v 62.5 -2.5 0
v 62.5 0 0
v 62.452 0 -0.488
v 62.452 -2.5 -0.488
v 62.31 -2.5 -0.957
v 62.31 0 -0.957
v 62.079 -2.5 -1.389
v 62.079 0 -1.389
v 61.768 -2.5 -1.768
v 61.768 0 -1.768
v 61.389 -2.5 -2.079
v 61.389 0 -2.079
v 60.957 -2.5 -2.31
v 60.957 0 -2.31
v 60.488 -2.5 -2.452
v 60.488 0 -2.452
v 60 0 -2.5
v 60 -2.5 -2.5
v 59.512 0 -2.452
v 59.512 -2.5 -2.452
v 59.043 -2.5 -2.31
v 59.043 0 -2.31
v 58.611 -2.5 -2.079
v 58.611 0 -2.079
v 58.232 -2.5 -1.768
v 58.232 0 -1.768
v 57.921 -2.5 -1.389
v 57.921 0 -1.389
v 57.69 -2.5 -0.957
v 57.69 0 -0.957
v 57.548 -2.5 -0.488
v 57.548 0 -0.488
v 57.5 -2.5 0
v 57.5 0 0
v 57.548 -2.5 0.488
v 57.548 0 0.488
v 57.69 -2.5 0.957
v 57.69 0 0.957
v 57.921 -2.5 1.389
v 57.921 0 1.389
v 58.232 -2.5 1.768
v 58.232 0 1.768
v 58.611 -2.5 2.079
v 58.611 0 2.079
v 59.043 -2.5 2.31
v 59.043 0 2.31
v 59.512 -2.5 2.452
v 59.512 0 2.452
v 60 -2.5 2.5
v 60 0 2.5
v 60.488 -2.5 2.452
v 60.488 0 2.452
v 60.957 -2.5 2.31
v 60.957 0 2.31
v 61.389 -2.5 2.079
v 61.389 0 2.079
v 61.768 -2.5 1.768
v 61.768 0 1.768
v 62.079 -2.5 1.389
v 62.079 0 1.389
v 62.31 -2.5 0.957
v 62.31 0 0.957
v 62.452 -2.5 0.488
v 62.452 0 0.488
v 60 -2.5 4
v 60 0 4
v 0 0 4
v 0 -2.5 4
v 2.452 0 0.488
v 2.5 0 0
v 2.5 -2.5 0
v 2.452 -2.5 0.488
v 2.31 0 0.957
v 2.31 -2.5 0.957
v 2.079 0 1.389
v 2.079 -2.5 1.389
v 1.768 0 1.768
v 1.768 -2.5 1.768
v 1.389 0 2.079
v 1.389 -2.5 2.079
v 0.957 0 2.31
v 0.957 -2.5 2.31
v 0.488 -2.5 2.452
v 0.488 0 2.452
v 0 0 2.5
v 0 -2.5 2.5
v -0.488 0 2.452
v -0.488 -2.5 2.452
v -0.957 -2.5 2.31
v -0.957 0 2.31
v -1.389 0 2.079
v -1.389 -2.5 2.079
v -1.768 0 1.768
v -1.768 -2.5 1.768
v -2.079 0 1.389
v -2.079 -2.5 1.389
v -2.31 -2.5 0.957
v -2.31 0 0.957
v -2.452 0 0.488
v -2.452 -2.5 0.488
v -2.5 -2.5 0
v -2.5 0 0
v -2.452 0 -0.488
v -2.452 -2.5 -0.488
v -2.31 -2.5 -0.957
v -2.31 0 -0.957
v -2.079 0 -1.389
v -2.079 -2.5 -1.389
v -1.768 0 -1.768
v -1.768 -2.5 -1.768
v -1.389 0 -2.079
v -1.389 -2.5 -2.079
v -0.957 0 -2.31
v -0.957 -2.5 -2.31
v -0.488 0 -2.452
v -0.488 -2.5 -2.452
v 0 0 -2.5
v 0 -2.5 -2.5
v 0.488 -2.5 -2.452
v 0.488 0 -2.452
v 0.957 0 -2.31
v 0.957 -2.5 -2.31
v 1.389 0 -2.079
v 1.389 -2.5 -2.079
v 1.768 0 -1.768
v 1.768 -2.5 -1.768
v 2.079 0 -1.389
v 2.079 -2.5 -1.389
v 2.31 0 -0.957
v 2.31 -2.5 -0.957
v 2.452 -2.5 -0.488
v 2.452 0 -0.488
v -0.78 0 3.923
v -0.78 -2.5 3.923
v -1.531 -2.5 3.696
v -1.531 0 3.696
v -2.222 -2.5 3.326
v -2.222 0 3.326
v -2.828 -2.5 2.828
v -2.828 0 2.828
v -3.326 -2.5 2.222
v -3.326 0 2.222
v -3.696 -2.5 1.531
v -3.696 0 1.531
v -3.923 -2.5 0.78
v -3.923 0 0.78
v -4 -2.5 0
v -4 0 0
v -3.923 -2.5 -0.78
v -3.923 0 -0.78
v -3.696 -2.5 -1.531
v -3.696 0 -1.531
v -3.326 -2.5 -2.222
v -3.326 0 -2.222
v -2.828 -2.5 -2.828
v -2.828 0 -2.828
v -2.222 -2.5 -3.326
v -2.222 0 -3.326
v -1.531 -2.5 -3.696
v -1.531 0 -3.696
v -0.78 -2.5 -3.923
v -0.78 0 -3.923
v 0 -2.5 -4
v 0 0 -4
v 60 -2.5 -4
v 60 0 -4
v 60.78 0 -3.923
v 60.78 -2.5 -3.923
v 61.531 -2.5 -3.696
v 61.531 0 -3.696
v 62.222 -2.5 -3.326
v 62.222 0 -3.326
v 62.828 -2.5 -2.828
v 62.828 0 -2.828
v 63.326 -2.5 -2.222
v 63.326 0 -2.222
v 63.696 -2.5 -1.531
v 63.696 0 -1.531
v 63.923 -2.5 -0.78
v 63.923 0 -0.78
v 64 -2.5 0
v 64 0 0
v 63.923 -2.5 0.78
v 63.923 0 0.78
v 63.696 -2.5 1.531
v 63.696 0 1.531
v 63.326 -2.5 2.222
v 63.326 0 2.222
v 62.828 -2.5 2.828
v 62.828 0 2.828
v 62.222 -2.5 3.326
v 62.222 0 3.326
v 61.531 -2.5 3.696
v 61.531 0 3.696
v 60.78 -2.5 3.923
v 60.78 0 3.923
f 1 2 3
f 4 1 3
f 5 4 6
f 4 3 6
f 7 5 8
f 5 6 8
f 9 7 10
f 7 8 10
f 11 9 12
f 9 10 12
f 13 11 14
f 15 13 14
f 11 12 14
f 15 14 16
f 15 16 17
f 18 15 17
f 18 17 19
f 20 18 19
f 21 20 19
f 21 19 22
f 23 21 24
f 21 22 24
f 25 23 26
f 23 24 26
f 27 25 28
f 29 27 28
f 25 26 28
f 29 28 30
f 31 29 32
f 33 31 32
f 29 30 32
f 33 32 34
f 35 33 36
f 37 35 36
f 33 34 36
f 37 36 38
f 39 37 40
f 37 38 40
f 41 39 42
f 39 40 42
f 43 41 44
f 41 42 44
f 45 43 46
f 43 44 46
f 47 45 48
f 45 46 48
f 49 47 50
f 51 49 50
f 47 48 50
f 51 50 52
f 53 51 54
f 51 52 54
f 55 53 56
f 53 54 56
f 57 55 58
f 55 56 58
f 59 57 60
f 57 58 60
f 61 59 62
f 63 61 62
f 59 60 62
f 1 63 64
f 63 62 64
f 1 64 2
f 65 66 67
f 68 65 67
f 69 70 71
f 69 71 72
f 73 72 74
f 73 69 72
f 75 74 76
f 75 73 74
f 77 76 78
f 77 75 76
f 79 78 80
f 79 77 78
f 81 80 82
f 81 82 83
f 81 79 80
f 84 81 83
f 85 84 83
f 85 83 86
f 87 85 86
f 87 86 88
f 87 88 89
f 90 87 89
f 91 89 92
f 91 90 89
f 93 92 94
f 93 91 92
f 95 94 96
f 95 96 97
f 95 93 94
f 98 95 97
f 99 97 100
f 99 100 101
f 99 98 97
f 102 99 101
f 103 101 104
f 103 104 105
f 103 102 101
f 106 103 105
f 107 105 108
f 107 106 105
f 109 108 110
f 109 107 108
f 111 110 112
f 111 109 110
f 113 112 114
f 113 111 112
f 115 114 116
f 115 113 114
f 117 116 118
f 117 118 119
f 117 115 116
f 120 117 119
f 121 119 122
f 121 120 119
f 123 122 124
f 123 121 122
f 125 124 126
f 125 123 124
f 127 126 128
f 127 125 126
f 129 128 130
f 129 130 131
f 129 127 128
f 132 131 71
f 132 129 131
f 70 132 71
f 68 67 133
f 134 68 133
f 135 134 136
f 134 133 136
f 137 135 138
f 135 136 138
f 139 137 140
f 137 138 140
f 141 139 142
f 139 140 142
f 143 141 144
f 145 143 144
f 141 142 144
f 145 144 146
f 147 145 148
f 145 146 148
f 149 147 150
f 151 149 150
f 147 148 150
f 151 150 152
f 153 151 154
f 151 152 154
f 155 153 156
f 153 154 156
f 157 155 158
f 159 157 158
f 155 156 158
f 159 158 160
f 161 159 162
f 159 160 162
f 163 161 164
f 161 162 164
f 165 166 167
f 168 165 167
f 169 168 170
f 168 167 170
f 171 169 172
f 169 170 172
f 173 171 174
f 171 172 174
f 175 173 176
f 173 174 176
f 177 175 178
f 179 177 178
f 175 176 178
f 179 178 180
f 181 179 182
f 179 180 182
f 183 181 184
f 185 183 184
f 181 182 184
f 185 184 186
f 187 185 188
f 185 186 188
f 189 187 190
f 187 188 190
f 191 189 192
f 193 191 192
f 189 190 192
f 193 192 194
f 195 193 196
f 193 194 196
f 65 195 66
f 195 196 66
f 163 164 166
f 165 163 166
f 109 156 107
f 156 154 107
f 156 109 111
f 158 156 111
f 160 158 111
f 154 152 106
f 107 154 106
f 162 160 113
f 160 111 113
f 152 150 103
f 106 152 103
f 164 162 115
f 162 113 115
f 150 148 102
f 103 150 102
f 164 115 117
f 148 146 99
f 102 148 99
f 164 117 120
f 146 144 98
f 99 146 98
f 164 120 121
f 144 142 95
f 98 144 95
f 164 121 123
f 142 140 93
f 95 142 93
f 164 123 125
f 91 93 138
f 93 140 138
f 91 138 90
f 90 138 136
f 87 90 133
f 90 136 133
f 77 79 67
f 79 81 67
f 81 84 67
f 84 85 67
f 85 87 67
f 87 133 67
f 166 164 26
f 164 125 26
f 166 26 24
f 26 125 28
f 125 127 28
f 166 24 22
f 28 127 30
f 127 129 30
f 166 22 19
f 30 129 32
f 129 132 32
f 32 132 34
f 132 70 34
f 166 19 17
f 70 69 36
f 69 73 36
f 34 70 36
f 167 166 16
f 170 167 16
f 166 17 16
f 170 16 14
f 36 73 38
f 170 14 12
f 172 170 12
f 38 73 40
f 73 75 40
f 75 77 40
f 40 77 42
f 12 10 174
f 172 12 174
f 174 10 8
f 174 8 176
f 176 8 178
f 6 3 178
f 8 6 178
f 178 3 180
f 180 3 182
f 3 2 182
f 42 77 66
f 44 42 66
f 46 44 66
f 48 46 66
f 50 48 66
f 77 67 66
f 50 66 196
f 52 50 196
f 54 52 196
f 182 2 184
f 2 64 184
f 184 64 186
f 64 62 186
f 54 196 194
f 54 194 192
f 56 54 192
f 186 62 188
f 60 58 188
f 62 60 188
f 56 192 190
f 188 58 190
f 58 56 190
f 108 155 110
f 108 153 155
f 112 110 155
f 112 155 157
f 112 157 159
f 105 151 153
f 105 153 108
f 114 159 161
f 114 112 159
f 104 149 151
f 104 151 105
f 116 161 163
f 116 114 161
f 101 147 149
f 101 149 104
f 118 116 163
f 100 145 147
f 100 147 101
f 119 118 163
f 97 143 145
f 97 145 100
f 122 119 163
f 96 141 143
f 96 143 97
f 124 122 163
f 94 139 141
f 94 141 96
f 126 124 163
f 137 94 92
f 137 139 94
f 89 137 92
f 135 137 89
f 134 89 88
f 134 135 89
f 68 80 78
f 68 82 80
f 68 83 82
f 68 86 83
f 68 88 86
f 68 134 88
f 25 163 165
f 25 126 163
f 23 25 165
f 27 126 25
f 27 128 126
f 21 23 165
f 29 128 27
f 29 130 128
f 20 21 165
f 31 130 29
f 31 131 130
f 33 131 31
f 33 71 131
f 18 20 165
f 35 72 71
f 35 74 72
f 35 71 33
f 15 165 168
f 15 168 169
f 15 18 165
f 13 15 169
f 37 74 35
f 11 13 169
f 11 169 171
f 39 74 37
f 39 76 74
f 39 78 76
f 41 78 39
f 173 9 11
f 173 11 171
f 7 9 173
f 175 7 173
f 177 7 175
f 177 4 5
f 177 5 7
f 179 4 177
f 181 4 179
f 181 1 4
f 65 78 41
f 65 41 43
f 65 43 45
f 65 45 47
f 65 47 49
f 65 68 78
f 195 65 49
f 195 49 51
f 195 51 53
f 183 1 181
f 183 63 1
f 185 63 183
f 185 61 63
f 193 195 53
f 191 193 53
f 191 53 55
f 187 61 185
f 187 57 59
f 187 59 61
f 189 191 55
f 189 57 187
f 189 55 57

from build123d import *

# Parameters (mm, degrees)
F0_R     = 2.5
F1_DEPTH = 2.5


with BuildPart() as f1:
    # F0 (on Front) → F1 (new body)
    with BuildSketch(Plane.XZ):
        with BuildLine():
            Line((60, 4), (0, 4))
            ThreePointArc((0, 4), (-4, 0), (0, -4))
            Line((0, -4), (60, -4))
            ThreePointArc((60, -4), (64, 0), (60, 4))
        make_face()
        Circle(F0_R, mode=Mode.SUBTRACT)
        with BuildLine():
            ThreePointArc((57.5, 0), (60, 2.5), (62.5, 0))
            ThreePointArc((62.5, 0), (60, -2.5), (57.5, 0))
        make_face(mode=Mode.SUBTRACT)
    extrude(amount=F1_DEPTH)


solid = f1.part
